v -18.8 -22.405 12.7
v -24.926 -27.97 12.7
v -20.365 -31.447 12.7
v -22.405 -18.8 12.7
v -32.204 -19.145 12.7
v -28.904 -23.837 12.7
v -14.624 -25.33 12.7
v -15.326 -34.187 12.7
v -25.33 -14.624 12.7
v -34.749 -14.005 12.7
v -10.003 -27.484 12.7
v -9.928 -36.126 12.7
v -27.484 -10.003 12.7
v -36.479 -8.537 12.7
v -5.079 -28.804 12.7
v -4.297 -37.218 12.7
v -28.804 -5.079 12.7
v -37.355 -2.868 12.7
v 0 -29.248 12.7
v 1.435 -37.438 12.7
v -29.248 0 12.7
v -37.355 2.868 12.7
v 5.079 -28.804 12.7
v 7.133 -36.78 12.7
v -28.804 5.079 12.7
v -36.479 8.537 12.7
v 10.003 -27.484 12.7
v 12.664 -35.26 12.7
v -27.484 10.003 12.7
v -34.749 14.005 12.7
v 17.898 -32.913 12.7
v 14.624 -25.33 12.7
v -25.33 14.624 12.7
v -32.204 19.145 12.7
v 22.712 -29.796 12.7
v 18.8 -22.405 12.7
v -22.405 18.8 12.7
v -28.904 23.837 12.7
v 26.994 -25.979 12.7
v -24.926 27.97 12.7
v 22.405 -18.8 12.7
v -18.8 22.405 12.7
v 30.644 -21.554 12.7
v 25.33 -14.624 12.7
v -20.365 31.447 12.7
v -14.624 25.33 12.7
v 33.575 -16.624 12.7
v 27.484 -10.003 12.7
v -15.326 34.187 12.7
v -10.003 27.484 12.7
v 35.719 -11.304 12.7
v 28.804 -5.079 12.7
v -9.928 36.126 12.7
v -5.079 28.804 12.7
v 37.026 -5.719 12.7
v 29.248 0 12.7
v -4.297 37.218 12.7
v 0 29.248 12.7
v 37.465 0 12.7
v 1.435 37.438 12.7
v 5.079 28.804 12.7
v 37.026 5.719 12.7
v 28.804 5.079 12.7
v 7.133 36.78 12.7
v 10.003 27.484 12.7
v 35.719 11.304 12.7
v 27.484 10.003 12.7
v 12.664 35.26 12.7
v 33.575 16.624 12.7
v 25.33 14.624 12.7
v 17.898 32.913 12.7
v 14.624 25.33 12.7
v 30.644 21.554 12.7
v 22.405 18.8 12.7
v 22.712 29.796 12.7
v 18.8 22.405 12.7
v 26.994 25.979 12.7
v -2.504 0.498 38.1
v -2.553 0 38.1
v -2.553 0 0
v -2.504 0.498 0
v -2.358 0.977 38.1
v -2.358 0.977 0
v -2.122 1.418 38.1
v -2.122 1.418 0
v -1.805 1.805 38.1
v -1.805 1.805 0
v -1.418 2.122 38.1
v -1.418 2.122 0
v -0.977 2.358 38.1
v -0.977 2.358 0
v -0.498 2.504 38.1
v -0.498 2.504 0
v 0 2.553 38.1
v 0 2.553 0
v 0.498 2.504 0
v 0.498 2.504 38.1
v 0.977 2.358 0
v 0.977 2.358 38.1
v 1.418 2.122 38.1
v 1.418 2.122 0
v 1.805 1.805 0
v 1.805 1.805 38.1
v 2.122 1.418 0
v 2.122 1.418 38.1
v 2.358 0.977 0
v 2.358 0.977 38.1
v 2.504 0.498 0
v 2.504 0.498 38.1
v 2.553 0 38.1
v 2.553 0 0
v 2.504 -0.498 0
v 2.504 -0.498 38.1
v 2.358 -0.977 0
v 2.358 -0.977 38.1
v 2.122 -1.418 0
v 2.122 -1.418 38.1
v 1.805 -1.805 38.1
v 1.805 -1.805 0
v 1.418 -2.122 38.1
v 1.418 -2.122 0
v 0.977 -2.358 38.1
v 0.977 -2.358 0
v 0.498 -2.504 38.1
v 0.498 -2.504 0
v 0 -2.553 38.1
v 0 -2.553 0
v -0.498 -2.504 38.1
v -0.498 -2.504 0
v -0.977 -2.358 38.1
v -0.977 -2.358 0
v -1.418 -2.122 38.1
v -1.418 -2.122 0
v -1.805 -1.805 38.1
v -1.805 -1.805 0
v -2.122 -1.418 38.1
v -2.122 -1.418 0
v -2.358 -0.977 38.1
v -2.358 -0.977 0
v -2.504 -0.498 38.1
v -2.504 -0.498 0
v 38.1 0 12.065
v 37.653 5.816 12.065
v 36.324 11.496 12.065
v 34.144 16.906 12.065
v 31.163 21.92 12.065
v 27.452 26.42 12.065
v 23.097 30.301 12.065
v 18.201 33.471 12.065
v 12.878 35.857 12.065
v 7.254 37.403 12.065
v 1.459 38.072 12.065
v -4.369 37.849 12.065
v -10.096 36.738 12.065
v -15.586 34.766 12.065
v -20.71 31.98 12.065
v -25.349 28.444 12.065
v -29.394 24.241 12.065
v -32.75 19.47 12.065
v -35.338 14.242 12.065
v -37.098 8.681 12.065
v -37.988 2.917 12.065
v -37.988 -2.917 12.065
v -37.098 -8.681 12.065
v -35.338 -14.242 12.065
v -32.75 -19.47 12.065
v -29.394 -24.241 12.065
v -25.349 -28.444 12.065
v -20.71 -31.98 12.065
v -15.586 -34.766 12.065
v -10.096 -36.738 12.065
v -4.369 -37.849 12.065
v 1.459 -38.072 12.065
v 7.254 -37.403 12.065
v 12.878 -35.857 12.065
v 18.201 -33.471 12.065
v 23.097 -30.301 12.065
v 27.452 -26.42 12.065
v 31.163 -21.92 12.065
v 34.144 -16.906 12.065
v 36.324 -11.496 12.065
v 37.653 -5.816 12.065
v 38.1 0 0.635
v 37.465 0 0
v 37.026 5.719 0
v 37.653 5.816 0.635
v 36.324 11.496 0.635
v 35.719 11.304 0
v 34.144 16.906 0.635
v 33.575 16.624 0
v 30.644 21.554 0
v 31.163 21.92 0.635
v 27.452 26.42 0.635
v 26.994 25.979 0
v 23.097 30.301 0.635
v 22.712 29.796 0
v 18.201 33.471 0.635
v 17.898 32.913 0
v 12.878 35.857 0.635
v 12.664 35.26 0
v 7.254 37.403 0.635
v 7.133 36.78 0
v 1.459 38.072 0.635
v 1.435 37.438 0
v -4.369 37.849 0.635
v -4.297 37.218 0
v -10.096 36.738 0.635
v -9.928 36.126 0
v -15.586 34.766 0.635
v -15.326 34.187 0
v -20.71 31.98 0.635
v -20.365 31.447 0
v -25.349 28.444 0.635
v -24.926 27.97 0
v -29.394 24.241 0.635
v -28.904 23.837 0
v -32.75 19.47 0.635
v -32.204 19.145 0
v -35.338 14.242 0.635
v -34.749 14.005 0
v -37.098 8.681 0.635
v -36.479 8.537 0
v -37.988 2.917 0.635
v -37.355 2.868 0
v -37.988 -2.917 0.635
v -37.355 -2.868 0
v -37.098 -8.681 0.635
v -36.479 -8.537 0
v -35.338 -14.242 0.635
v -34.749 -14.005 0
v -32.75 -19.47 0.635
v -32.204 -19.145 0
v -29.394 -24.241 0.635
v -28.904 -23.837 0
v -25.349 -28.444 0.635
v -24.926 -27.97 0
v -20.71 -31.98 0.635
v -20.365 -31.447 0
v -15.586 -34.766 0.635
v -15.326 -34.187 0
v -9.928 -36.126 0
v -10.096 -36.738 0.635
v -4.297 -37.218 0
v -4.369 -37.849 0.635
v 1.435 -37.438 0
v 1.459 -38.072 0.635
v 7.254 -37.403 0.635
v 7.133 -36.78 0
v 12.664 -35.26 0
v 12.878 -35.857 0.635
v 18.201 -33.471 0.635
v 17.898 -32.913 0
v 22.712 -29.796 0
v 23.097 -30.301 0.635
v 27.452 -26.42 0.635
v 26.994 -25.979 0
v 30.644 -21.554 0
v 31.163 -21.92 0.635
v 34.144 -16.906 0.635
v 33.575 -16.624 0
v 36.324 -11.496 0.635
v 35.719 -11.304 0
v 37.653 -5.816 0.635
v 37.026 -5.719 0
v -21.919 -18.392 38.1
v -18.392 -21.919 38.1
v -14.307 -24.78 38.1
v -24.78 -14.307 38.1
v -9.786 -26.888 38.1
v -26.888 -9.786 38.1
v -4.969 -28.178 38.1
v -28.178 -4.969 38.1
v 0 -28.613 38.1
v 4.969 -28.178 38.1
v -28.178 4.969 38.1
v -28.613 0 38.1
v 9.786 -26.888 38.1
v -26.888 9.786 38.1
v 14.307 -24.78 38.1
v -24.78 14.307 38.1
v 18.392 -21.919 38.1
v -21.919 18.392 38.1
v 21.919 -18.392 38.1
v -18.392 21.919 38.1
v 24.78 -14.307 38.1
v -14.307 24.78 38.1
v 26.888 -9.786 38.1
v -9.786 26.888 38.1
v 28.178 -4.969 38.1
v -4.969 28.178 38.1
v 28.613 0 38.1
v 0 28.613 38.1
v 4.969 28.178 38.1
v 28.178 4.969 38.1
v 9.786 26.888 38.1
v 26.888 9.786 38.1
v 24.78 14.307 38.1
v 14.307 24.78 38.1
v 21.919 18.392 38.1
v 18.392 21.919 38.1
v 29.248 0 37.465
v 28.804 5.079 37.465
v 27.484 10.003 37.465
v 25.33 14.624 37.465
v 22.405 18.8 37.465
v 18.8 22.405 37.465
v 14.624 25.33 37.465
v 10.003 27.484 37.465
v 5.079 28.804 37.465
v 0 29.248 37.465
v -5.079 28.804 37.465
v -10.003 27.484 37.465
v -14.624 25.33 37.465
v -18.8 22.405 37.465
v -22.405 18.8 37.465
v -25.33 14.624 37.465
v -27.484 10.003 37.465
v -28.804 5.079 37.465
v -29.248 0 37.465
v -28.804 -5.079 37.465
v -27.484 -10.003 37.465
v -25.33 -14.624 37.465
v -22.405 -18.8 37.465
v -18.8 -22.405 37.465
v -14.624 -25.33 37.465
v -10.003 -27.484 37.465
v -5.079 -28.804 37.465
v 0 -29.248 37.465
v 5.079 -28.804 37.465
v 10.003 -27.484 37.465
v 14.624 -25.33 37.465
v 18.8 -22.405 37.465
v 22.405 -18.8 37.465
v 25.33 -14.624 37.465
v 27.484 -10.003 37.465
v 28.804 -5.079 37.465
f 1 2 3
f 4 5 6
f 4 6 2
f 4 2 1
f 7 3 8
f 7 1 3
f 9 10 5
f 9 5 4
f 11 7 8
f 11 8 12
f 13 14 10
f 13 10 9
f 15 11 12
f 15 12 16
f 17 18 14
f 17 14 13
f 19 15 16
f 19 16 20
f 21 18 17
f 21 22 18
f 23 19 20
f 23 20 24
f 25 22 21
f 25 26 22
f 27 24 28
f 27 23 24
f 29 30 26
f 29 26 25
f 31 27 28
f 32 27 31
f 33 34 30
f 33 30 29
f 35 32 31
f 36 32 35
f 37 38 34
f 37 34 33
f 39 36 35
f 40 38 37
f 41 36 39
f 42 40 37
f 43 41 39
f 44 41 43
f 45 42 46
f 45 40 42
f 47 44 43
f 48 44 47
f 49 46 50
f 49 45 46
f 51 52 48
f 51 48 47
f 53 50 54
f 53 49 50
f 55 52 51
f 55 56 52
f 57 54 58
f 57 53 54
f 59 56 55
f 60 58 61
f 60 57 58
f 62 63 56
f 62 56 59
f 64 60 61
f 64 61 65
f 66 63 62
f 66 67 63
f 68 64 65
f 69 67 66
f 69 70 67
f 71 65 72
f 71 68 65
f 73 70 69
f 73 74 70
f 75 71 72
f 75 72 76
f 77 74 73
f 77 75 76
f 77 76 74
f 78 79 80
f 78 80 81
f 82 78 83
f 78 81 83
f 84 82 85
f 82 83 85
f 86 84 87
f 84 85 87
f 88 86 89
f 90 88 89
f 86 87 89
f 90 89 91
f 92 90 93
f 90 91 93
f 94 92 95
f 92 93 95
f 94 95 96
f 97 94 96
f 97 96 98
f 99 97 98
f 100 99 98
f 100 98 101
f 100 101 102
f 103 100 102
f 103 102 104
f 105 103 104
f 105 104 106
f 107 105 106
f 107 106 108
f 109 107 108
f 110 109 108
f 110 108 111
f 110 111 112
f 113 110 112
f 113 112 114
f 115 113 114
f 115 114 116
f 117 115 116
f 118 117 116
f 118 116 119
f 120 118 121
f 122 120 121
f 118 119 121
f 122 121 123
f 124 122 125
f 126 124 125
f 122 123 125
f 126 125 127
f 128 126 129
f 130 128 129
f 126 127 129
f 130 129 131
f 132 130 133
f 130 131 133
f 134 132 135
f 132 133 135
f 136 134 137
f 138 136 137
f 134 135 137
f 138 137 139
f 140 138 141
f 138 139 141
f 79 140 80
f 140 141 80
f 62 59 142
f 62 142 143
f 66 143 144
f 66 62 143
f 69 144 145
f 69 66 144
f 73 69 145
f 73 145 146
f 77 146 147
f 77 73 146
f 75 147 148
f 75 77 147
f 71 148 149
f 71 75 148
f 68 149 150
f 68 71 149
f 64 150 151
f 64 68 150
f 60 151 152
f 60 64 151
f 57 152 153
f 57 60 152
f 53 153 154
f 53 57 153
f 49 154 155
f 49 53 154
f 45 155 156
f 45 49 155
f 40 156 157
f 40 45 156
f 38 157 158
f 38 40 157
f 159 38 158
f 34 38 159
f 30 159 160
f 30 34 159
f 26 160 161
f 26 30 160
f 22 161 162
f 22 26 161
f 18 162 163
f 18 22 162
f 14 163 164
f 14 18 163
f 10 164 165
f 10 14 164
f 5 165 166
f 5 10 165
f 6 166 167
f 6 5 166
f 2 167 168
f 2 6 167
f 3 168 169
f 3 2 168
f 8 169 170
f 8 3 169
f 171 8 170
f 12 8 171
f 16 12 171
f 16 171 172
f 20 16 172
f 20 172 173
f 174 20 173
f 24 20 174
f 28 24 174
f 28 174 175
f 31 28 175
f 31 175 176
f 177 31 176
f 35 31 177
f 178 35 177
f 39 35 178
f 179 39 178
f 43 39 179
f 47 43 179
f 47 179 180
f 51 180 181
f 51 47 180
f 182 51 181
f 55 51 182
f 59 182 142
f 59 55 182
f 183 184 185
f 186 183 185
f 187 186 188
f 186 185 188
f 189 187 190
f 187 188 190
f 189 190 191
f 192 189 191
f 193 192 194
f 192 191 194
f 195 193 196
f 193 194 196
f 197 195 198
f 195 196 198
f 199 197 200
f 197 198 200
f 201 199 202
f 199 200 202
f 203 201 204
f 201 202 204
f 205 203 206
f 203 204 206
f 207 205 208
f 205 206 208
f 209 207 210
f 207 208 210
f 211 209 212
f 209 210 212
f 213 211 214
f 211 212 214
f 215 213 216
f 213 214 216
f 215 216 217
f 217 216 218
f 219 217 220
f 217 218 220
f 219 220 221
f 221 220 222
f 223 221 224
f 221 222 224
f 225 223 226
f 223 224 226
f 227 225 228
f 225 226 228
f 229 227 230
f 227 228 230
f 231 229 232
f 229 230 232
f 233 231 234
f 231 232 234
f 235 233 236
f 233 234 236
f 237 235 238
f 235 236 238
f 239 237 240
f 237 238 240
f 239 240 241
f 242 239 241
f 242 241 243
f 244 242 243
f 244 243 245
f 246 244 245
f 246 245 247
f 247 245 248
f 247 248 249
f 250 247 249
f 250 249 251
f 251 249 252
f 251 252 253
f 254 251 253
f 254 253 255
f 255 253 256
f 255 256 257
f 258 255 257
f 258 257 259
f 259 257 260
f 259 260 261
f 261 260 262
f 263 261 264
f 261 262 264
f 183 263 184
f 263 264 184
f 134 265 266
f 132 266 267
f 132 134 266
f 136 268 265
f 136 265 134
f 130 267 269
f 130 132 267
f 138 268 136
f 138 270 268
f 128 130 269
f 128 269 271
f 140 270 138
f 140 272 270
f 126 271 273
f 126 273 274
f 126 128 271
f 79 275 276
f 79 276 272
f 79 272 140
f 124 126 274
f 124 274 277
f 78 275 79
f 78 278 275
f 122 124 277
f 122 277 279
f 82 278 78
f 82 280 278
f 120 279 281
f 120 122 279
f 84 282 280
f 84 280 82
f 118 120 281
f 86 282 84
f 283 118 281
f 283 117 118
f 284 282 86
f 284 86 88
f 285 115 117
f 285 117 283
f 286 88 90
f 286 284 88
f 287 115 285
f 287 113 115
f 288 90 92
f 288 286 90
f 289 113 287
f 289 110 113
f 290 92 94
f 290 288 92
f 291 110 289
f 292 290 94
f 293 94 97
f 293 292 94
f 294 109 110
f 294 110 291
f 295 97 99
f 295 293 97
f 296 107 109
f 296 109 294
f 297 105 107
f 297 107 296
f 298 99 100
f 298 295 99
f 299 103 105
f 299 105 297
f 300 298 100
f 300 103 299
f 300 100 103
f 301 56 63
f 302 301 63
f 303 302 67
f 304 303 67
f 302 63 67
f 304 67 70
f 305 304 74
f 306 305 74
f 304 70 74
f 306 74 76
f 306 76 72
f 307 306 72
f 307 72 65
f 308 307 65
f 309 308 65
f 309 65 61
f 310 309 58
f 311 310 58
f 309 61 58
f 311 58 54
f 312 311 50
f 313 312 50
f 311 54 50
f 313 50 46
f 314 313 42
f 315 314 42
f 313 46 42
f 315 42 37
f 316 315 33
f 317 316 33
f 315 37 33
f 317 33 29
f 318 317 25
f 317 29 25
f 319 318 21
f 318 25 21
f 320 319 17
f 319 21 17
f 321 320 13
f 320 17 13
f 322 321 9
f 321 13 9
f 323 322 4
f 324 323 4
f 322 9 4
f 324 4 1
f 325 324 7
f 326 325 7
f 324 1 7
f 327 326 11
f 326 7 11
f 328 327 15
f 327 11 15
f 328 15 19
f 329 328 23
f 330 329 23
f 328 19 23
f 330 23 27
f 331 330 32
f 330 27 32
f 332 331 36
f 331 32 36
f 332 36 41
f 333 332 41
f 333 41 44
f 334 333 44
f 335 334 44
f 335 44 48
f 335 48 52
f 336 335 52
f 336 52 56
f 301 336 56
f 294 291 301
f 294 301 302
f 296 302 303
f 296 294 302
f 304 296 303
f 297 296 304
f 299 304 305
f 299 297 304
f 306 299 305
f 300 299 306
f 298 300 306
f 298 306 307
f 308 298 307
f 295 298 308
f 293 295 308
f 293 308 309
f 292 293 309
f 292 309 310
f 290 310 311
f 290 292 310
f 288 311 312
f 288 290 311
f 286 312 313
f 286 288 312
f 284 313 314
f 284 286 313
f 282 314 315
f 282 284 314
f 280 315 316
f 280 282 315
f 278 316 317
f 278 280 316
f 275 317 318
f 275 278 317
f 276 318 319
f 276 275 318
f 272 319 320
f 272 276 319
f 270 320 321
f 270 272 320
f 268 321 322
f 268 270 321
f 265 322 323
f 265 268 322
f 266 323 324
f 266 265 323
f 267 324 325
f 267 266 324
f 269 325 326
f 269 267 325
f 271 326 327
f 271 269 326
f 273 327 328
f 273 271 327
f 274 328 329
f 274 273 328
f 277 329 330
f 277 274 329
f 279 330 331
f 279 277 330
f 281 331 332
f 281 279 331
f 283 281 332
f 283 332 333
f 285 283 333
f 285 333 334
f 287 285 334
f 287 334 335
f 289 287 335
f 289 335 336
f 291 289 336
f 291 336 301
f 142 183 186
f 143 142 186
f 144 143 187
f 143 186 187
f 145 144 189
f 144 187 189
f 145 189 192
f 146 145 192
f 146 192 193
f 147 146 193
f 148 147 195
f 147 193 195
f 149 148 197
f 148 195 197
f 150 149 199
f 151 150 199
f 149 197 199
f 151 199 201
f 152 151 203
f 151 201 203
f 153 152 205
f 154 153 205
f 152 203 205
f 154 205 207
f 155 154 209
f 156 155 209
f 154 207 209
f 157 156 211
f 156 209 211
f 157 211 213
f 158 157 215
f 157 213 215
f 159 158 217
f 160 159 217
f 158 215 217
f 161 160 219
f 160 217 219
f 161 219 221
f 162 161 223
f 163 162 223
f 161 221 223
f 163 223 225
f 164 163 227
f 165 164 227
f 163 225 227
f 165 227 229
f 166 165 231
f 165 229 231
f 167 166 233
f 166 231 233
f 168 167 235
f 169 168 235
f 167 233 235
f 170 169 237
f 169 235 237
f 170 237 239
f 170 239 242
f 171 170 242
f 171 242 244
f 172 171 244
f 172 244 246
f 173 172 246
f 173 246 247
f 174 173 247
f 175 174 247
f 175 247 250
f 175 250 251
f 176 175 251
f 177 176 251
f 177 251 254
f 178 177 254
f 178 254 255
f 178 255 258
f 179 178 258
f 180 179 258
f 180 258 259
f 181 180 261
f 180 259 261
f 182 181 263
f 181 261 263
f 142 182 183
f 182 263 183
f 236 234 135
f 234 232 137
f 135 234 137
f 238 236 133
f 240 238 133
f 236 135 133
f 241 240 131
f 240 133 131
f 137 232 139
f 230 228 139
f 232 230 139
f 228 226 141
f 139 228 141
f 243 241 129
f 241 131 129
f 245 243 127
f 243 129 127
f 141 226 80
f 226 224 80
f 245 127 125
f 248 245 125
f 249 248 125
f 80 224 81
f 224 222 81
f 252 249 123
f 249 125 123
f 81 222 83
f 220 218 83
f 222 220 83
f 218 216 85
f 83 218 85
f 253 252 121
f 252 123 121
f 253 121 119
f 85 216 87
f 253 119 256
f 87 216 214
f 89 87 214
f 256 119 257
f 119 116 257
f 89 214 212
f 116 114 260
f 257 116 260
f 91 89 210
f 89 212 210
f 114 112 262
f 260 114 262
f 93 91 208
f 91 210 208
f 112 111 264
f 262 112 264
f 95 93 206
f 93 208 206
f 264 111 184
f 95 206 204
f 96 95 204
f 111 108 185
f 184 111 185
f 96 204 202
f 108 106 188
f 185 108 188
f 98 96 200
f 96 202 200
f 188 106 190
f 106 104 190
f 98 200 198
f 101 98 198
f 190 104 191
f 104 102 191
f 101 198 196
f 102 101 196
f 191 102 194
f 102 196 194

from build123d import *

# Parameters (mm, degrees)
F0_R     = 38.1
F1_DEPTH = 12.7
F2_R     = 29.2481
F3_DEPTH = 25.4
F4_SIZE  = 0.635
F6_D     = 5.1054


with BuildPart() as f1:
    # F0 (on Top) → F1 (new body)
    with BuildSketch(Plane.XY):
        Circle(F0_R)
    extrude(amount=F1_DEPTH)

    # F2 (on face) → F3 (join)
    with BuildSketch(Plane.XY.offset(12.7)):
        Circle(F2_R)
    extrude(amount=F3_DEPTH)

    # F4
    f4_edges = [f1.edges().sort_by_distance(p)[0] for p in [
        (-29.2481, 0, 38.1),
        (-38.1, 0, 12.7),
        (-38.1, 0, 0),
    ]]
    chamfer(f4_edges, length=F4_SIZE)

    # F6 (through all)
    with Locations(Plane.XY.offset(38.1)):
        with Locations((0, 0)):
            Hole(F6_D / 2)


solid = f1.part
